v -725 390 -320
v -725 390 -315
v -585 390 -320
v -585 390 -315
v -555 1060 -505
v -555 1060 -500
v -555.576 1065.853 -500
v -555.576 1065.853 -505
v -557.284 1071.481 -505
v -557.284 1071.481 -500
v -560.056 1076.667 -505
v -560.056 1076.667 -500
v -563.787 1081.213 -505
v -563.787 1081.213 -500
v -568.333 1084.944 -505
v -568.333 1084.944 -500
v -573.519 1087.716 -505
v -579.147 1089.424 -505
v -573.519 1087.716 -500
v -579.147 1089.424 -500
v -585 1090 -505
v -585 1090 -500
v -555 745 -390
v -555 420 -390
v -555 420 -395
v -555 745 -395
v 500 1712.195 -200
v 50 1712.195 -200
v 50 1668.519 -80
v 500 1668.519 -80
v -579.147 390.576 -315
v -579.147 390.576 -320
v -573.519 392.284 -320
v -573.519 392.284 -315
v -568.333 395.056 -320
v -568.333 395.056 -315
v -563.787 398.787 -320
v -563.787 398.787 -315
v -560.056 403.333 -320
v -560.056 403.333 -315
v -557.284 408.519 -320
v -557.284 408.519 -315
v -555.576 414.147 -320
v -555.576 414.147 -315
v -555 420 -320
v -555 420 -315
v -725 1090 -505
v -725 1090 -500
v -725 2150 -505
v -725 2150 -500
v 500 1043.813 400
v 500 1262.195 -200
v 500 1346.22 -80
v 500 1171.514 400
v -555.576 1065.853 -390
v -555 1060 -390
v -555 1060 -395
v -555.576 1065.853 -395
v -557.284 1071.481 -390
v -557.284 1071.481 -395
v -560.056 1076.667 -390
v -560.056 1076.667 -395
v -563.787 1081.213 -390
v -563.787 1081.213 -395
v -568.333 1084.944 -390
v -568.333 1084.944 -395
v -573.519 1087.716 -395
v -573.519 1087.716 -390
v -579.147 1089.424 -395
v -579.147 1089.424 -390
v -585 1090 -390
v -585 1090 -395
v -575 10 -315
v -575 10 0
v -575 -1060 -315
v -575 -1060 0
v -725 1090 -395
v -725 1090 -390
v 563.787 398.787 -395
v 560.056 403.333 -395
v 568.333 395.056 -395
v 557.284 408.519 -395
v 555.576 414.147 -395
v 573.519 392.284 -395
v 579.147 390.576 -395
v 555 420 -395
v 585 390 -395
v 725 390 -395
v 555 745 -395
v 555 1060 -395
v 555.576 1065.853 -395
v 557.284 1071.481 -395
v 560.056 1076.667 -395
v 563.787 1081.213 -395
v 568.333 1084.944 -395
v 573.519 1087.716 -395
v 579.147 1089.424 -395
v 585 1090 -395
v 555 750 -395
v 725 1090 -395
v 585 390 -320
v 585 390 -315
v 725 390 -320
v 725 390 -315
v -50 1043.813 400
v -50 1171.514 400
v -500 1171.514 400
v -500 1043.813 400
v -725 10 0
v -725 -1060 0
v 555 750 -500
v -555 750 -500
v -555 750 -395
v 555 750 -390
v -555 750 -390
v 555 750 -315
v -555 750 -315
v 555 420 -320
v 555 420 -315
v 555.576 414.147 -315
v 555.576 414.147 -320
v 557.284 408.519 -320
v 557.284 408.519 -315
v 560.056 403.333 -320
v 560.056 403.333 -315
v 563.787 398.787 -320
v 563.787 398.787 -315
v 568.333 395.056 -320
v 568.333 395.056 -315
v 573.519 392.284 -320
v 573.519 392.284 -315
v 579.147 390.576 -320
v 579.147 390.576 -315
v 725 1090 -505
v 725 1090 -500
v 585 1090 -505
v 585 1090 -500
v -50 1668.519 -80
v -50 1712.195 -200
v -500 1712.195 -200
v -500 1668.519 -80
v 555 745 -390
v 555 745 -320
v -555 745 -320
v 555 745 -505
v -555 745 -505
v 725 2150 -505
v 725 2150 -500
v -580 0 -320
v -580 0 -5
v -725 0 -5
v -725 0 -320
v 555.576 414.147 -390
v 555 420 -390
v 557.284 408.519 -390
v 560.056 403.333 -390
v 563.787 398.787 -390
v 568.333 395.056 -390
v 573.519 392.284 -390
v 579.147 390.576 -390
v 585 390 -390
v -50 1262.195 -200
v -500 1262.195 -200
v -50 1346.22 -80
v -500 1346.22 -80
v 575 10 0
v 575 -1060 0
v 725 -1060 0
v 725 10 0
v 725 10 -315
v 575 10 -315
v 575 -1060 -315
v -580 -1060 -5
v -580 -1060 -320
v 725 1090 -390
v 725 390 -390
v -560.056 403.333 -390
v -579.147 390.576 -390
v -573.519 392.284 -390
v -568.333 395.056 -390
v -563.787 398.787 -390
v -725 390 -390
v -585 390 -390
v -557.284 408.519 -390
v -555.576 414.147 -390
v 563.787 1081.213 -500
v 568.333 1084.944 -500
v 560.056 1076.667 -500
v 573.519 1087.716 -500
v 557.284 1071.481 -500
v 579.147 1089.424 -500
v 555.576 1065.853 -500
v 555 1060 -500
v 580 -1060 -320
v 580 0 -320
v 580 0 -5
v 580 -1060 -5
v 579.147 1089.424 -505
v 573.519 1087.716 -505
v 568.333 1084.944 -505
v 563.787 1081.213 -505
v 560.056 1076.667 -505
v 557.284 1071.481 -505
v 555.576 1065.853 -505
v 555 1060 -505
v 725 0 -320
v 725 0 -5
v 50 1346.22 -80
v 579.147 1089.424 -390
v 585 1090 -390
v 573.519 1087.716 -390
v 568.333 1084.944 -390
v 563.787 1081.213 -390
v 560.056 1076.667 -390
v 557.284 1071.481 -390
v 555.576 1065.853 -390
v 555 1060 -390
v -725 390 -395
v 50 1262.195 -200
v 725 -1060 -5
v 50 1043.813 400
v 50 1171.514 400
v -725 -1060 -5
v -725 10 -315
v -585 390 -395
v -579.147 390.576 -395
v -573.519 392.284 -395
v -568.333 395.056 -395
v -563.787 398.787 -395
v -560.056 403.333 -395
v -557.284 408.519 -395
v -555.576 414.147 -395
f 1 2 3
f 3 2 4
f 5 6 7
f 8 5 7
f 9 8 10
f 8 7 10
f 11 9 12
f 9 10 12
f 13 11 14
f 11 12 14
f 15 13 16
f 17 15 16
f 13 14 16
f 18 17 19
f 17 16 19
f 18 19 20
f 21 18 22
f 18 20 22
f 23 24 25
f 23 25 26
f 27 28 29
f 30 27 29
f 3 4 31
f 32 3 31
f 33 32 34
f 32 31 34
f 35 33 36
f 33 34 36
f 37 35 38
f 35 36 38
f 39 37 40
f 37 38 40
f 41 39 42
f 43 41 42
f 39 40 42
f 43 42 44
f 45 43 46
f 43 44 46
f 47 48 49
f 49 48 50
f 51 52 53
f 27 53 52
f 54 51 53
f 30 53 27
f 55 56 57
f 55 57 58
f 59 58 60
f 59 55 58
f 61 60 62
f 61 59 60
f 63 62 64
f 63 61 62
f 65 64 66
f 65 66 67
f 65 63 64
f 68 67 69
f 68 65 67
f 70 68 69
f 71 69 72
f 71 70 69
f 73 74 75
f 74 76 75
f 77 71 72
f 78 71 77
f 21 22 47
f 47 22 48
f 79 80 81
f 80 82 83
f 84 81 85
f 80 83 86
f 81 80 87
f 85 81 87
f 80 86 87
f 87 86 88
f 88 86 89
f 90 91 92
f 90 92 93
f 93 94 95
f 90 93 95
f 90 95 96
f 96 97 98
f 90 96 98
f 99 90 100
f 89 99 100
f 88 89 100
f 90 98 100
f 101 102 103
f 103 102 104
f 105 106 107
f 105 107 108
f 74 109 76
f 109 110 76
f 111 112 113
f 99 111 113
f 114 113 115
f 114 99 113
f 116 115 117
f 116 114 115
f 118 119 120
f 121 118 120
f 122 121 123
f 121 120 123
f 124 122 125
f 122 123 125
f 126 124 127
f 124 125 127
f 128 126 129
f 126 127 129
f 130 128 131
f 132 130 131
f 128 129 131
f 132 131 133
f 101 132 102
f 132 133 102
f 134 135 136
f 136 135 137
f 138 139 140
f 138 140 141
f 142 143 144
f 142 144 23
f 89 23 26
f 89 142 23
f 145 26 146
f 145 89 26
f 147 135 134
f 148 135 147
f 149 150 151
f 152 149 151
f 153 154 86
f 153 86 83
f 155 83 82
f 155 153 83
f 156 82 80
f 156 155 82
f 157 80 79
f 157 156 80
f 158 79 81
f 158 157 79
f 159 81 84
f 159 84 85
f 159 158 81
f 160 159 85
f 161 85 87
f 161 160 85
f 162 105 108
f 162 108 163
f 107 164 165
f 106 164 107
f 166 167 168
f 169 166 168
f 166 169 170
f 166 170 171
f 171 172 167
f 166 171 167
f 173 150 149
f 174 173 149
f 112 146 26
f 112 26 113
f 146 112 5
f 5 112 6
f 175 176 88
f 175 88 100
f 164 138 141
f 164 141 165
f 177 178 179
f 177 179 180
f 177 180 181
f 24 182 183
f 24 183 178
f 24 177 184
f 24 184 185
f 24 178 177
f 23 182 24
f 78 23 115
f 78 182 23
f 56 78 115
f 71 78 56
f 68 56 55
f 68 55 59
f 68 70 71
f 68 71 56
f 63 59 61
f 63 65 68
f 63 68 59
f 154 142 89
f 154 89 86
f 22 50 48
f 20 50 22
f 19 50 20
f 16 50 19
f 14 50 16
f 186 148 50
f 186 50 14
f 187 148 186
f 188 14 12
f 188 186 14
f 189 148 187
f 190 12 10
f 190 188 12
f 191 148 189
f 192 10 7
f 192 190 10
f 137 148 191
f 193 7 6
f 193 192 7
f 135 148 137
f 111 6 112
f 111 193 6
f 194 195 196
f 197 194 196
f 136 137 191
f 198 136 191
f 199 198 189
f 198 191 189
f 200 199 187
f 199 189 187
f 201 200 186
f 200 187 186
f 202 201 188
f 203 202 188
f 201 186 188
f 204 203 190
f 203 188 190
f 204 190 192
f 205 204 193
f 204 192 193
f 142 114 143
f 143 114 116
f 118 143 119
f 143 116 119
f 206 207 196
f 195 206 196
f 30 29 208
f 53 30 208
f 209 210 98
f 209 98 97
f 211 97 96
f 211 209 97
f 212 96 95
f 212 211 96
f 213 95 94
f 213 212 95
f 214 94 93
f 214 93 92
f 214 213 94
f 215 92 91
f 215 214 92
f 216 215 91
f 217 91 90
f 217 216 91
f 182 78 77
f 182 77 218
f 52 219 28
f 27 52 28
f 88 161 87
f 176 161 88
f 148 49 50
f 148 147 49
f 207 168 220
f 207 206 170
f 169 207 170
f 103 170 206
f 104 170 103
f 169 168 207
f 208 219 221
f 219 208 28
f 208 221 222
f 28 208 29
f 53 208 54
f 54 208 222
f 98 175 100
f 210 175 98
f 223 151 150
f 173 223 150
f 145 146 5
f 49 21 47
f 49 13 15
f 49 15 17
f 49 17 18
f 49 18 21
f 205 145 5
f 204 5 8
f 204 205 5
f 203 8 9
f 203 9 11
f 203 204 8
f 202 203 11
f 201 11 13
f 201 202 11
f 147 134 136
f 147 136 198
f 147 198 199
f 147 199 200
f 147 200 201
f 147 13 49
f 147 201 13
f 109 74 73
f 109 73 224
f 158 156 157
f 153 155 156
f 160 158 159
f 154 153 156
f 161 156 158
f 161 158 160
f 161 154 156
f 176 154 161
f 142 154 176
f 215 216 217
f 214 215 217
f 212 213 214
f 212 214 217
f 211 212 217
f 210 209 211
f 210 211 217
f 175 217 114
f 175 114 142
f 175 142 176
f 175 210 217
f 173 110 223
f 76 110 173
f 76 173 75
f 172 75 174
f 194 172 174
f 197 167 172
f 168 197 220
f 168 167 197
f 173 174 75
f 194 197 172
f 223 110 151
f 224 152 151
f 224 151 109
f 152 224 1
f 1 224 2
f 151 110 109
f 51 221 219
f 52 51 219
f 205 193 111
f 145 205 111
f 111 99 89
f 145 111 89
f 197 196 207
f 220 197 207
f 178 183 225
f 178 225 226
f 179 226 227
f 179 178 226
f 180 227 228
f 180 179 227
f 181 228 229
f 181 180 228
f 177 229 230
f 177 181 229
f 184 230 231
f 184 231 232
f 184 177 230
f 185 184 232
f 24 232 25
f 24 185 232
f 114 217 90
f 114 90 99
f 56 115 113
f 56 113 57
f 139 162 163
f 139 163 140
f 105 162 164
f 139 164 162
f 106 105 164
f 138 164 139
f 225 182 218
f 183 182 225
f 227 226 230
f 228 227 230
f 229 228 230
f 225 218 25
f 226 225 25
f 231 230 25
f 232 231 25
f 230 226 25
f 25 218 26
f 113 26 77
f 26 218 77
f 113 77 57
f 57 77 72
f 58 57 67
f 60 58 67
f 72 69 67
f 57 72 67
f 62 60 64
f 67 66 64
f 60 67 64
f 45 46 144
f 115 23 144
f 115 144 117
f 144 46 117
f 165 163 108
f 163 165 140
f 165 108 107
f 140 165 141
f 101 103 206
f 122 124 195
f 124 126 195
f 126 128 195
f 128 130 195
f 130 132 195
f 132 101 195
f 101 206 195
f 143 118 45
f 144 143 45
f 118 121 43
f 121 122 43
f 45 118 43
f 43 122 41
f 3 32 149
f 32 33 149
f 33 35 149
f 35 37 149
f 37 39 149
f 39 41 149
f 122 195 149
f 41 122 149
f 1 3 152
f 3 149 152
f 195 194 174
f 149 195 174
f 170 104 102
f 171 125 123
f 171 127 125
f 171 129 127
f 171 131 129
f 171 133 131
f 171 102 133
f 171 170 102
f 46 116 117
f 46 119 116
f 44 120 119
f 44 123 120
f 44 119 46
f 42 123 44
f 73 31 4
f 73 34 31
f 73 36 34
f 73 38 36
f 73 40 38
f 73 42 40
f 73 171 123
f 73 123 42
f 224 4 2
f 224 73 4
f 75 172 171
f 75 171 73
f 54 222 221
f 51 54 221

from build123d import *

# Parameters (mm, degrees)
F3_DEPTH       = 1060
F5_DEPTH       = 10
F6_W           = 1450
F6_H           = 5
F7_DEPTH       = 740
F12_DEPTH      = 725
F12_DEPTH_BACK = 725
F14_DEPTH      = 205
F15_START      = -90
F15_DEPTH      = 5
F17_START      = 50
F17_DEPTH      = 450


with BuildPart() as f3:
    # F2 (on Front) → F3 (new body)
    with BuildSketch(Plane.XZ):
        Polygon((-575, 0), (-725, 0), (-725, -5), (-580, -5), (-580, -320), (0, -320), (580, -320), (580, -5), (725, -5), (725, 0), (575, 0), (575, -315), (0, -315), (-575, -315), align=None)
    extrude(amount=F3_DEPTH)

    # F4 (on face) → F5 (join)
    with BuildSketch(Plane(origin=(0, 0, 0), x_dir=(-1, 0, 0), z_dir=(0, 1, 0))):
        Polygon((-575, 0), (-725, 0), (-725, -320), (725, -320), (725, 0), (575, 0), (575, -315), (-575, -315), align=None)
    extrude(amount=F5_DEPTH)

    # F6 (on face) → F7 (join, through all)
    with BuildSketch(Plane(origin=(0, 10, 0), x_dir=(-1, 0, 0), z_dir=(0, 1, 0))):
        with Locations((0, -317.5)):
            Rectangle(F6_W, F6_H)
    extrude(amount=F7_DEPTH)

    # F10 (on Right) → F12 (join, two sides)
    with BuildSketch(Plane.YZ) as f12_sk:
        Polygon((750, -500), (750, -315), (745, -315), (745, -505), (2150, -505), (2150, -500), align=None)
    extrude(amount=F12_DEPTH)
    extrude(f12_sk.sketch, amount=-F12_DEPTH_BACK)

    # F13 (on offset) → F14 (cut, through all)
    with BuildSketch(Plane.XY.offset(-300)):
        with BuildLine():
            Line((585, 390), (725, 390))
            Line((725, 390), (725, 1090))
            Line((725, 1090), (585, 1090))
            ThreePointArc((585, 1090), (563.7867965644, 1081.2132034356), (555, 1060))
            Line((555, 1060), (555, 420))
            ThreePointArc((555, 420), (563.7867965644, 398.7867965644), (585, 390))
        make_face()
        with BuildLine():
            ThreePointArc((-555, 1060), (-563.7867965644, 1081.2132034356), (-585, 1090))
            Line((-585, 1090), (-725, 1090))
            Line((-725, 1090), (-725, 390))
            Line((-725, 390), (-585, 390))
            ThreePointArc((-585, 390), (-563.7867965644, 398.7867965644), (-555, 420))
            Line((-555, 420), (-555, 1060))
        make_face()
    extrude(amount=-F14_DEPTH, mode=Mode.SUBTRACT)

    # F13 (on offset) → F15 (join)
    with BuildSketch(Plane.XY.offset(-300).offset(F15_START)):
        with BuildLine():
            Line((585, 390), (725, 390))
            Line((725, 390), (725, 1090))
            Line((725, 1090), (585, 1090))
            ThreePointArc((585, 1090), (563.7867965644, 1081.2132034356), (555, 1060))
            Line((555, 1060), (555, 420))
            ThreePointArc((555, 420), (563.7867965644, 398.7867965644), (585, 390))
        make_face()
        with BuildLine():
            ThreePointArc((-555, 1060), (-563.7867965644, 1081.2132034356), (-585, 1090))
            Line((-585, 1090), (-725, 1090))
            Line((-725, 1090), (-725, 390))
            Line((-725, 390), (-585, 390))
            ThreePointArc((-585, 390), (-563.7867965644, 398.7867965644), (-555, 420))
            Line((-555, 420), (-555, 1060))
        make_face()
    extrude(amount=-F15_DEPTH)


with BuildPart() as f17:
    # F16 (on Right) → F17 (new body)
    with BuildSketch(Plane.YZ.offset(F17_START)):
        Polygon((1171.5141930266, 400), (1043.8128603295, 400), (1262.1950008892, -200), (1712.1950008892, -200), (1668.5185727773, -80), (1346.2199054744, -80), align=None)
    extrude(amount=F17_DEPTH)


with BuildPart() as f18_1:
    # F18: instance of F17
    add(f17.part.mirror(Plane.YZ))


solid = Compound([f3.part, f17.part, f18_1.part])
